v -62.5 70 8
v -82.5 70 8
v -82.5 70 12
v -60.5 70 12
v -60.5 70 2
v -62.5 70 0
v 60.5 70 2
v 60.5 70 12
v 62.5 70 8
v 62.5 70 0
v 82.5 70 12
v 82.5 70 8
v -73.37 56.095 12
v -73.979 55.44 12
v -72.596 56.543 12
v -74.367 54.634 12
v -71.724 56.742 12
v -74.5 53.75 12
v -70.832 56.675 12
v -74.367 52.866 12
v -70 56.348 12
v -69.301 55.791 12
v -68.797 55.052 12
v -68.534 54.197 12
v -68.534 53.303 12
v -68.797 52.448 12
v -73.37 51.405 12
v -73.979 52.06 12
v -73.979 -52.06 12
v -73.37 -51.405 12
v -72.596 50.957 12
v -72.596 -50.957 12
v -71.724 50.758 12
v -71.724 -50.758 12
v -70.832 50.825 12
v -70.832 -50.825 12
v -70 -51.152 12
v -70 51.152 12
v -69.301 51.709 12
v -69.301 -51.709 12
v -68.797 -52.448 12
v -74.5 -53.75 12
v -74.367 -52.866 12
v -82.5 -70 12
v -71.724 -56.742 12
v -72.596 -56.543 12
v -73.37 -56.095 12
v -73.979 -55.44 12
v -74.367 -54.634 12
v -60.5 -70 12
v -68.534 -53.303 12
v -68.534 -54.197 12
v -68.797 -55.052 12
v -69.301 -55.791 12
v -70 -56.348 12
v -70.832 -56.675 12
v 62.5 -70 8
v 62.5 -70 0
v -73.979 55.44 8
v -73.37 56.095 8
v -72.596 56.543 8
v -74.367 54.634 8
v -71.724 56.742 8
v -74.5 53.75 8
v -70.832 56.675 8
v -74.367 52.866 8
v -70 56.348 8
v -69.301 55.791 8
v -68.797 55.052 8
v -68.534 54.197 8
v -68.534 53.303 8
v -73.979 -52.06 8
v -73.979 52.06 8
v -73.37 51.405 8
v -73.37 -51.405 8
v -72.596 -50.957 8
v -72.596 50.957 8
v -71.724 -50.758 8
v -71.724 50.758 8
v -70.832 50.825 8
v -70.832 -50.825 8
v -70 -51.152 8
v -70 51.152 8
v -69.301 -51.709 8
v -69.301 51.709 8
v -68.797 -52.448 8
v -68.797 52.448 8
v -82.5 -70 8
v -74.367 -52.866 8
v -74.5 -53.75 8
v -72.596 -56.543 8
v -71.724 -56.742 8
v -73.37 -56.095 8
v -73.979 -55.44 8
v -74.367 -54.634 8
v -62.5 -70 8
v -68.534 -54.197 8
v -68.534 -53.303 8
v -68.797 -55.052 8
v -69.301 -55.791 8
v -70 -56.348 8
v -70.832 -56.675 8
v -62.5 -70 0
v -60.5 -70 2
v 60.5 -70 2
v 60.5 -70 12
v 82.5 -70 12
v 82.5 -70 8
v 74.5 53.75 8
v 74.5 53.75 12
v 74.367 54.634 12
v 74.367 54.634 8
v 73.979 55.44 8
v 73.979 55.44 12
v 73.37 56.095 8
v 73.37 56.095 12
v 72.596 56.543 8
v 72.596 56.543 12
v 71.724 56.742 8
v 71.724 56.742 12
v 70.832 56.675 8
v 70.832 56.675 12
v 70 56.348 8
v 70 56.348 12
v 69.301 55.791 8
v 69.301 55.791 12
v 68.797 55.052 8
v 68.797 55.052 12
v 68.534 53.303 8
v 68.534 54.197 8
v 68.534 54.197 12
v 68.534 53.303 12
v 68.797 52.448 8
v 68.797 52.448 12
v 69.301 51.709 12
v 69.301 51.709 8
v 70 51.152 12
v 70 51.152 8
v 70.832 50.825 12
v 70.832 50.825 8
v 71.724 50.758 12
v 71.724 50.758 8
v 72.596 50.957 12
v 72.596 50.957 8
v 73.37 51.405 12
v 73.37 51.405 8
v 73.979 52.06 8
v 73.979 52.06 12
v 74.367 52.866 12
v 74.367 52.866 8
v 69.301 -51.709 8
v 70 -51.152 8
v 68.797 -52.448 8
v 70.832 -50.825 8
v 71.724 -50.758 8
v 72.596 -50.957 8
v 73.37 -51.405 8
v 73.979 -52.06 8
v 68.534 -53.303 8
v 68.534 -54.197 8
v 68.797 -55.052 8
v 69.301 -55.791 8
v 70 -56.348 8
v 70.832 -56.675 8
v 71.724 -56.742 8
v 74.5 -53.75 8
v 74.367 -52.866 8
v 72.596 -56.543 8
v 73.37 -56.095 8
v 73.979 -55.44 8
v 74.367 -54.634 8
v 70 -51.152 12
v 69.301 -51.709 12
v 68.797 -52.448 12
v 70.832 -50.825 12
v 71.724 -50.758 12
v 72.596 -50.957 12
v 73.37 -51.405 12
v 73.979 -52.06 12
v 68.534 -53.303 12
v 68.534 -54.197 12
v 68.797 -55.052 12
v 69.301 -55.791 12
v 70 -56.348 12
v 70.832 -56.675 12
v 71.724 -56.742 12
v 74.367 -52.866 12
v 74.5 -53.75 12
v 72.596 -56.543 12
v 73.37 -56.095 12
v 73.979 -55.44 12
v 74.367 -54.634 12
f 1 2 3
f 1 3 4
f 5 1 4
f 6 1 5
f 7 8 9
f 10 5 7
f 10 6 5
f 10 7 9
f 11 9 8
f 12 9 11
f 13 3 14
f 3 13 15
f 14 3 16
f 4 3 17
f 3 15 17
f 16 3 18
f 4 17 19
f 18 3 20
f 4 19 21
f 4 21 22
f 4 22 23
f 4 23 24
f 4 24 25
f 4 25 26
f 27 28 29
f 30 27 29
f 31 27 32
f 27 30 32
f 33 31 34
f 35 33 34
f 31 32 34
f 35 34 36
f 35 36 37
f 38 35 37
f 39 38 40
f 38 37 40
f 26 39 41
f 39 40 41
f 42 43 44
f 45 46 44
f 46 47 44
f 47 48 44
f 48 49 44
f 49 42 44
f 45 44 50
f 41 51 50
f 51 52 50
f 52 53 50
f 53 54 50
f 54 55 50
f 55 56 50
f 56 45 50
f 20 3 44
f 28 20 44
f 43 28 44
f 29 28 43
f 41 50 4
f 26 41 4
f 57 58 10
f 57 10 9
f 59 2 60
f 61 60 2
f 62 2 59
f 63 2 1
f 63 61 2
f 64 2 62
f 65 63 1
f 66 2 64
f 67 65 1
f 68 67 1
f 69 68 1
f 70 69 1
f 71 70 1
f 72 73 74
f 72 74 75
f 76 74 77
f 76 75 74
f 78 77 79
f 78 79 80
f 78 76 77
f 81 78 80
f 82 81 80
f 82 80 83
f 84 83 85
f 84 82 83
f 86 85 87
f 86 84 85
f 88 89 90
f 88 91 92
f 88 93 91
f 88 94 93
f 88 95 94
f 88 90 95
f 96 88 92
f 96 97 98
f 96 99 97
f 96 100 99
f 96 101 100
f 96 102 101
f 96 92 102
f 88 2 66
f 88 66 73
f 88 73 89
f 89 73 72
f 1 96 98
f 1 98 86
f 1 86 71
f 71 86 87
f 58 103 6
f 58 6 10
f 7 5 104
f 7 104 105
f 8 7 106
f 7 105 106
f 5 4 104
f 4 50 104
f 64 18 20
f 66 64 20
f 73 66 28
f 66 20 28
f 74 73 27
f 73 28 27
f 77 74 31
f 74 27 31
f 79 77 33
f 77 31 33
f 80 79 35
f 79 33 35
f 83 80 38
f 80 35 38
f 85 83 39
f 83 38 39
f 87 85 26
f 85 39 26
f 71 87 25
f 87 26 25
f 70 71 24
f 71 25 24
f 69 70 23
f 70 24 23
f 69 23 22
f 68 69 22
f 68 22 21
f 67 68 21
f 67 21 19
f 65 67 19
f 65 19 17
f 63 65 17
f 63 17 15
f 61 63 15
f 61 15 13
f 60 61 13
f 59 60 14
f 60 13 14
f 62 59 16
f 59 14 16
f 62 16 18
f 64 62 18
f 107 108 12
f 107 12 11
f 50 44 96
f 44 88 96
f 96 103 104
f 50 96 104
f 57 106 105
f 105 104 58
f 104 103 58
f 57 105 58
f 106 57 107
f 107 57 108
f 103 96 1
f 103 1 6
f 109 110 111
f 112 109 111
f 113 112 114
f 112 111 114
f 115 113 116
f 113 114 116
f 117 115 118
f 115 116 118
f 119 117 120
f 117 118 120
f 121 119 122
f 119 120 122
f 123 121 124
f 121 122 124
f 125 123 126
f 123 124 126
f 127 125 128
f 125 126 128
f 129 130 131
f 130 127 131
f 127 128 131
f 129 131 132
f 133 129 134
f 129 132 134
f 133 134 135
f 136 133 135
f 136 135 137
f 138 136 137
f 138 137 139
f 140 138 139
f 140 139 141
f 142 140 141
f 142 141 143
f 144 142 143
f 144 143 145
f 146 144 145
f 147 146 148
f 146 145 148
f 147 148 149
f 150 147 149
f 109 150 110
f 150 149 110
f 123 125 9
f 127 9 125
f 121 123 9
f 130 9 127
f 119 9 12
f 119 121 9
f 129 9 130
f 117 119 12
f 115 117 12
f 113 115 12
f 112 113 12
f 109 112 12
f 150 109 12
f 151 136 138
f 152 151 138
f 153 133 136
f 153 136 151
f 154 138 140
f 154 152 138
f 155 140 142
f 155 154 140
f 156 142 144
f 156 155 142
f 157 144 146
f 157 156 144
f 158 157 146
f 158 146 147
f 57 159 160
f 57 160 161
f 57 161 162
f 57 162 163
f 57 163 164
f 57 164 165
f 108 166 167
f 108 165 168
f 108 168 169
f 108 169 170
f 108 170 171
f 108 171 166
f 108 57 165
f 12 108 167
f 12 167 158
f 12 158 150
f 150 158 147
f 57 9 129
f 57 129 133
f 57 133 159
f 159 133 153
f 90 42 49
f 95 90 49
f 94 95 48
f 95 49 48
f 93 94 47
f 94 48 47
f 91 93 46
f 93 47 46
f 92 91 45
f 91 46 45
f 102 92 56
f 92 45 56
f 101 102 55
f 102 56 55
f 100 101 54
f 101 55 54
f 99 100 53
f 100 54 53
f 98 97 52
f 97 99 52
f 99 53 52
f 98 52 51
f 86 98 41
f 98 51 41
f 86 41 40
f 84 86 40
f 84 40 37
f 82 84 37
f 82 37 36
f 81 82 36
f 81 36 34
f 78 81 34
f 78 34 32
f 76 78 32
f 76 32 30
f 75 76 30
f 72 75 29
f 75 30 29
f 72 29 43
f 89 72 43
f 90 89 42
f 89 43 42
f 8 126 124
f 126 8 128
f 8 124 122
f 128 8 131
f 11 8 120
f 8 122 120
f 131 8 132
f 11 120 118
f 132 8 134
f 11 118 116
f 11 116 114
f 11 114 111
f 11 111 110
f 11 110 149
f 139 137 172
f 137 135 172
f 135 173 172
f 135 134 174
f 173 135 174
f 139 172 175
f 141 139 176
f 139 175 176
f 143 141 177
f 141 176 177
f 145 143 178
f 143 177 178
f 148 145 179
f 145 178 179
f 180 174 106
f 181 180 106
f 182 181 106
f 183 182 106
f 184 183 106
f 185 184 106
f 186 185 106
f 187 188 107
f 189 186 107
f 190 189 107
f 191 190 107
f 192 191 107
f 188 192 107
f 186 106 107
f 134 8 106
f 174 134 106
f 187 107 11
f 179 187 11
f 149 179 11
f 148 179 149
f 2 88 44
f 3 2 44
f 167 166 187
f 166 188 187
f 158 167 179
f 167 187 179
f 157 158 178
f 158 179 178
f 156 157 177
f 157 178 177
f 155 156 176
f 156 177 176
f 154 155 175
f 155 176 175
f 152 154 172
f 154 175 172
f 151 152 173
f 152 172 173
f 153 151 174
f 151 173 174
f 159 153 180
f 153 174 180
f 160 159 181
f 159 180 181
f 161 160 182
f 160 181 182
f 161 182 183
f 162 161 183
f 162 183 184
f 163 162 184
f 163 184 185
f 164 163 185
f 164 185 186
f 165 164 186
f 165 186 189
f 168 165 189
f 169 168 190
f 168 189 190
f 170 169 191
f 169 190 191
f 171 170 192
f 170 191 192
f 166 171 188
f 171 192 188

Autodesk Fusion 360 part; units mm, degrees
sketch "extrusion" plane through (0, 0, 0) normal (0, 1, 0) x (1, 0, 0)
  line L0 (-82.5, -8) -> (-62.5, -8)
  line L1 (-62.5, -8) -> (-62.5, 0)
  line L2 (-62.5, 0) -> (62.5, 0)
  line L3 (62.5, 0) -> (62.5, -8)
  line L4 (62.5, -8) -> (82.5, -8)
  line L5 (-60.5, -12) -> (-60.5, -2)
  line L6 (-60.5, -2) -> (60.5, -2)
  line L7 (60.5, -2) -> (60.5, -12)
  line L8 (-82.5, -12) -> (-60.5, -12)
  line L9 (60.5, -12) -> (82.5, -12)
  line L10 (-82.5, -8) -> (-82.5, -12)
  line L11 (82.5, -8) -> (82.5, -12)
  dimension "d1" = 125
  dimension "d2" = 8
  dimension "d3" = 20
  dimension "d4" = 8
  dimension "d5" = 20
extrude "Extrude1" add sketch "extrusion" along normal mid plane 140
sketch "top holes" plane through (0, 0, 12) normal (0, 0, 1) x (-1, 0, 0)
  circle A0 centre (71.5, -53.75) radius 3
  line L0 (82.5, -70) -> (60.5, -70)
  dimension "d11" = 6
  dimension "d12" = 16.25
extrude "Extrude2" cut sketch "top holes" against normal blind 4
mirror "Mirror1" about plane through (0, 0, 0) normal (1, 0, 0) of "Extrude2"
mirror "Mirror2" about plane through (0, 0, 0) normal (0, 1, 0) of "Extrude2", "Mirror1"
